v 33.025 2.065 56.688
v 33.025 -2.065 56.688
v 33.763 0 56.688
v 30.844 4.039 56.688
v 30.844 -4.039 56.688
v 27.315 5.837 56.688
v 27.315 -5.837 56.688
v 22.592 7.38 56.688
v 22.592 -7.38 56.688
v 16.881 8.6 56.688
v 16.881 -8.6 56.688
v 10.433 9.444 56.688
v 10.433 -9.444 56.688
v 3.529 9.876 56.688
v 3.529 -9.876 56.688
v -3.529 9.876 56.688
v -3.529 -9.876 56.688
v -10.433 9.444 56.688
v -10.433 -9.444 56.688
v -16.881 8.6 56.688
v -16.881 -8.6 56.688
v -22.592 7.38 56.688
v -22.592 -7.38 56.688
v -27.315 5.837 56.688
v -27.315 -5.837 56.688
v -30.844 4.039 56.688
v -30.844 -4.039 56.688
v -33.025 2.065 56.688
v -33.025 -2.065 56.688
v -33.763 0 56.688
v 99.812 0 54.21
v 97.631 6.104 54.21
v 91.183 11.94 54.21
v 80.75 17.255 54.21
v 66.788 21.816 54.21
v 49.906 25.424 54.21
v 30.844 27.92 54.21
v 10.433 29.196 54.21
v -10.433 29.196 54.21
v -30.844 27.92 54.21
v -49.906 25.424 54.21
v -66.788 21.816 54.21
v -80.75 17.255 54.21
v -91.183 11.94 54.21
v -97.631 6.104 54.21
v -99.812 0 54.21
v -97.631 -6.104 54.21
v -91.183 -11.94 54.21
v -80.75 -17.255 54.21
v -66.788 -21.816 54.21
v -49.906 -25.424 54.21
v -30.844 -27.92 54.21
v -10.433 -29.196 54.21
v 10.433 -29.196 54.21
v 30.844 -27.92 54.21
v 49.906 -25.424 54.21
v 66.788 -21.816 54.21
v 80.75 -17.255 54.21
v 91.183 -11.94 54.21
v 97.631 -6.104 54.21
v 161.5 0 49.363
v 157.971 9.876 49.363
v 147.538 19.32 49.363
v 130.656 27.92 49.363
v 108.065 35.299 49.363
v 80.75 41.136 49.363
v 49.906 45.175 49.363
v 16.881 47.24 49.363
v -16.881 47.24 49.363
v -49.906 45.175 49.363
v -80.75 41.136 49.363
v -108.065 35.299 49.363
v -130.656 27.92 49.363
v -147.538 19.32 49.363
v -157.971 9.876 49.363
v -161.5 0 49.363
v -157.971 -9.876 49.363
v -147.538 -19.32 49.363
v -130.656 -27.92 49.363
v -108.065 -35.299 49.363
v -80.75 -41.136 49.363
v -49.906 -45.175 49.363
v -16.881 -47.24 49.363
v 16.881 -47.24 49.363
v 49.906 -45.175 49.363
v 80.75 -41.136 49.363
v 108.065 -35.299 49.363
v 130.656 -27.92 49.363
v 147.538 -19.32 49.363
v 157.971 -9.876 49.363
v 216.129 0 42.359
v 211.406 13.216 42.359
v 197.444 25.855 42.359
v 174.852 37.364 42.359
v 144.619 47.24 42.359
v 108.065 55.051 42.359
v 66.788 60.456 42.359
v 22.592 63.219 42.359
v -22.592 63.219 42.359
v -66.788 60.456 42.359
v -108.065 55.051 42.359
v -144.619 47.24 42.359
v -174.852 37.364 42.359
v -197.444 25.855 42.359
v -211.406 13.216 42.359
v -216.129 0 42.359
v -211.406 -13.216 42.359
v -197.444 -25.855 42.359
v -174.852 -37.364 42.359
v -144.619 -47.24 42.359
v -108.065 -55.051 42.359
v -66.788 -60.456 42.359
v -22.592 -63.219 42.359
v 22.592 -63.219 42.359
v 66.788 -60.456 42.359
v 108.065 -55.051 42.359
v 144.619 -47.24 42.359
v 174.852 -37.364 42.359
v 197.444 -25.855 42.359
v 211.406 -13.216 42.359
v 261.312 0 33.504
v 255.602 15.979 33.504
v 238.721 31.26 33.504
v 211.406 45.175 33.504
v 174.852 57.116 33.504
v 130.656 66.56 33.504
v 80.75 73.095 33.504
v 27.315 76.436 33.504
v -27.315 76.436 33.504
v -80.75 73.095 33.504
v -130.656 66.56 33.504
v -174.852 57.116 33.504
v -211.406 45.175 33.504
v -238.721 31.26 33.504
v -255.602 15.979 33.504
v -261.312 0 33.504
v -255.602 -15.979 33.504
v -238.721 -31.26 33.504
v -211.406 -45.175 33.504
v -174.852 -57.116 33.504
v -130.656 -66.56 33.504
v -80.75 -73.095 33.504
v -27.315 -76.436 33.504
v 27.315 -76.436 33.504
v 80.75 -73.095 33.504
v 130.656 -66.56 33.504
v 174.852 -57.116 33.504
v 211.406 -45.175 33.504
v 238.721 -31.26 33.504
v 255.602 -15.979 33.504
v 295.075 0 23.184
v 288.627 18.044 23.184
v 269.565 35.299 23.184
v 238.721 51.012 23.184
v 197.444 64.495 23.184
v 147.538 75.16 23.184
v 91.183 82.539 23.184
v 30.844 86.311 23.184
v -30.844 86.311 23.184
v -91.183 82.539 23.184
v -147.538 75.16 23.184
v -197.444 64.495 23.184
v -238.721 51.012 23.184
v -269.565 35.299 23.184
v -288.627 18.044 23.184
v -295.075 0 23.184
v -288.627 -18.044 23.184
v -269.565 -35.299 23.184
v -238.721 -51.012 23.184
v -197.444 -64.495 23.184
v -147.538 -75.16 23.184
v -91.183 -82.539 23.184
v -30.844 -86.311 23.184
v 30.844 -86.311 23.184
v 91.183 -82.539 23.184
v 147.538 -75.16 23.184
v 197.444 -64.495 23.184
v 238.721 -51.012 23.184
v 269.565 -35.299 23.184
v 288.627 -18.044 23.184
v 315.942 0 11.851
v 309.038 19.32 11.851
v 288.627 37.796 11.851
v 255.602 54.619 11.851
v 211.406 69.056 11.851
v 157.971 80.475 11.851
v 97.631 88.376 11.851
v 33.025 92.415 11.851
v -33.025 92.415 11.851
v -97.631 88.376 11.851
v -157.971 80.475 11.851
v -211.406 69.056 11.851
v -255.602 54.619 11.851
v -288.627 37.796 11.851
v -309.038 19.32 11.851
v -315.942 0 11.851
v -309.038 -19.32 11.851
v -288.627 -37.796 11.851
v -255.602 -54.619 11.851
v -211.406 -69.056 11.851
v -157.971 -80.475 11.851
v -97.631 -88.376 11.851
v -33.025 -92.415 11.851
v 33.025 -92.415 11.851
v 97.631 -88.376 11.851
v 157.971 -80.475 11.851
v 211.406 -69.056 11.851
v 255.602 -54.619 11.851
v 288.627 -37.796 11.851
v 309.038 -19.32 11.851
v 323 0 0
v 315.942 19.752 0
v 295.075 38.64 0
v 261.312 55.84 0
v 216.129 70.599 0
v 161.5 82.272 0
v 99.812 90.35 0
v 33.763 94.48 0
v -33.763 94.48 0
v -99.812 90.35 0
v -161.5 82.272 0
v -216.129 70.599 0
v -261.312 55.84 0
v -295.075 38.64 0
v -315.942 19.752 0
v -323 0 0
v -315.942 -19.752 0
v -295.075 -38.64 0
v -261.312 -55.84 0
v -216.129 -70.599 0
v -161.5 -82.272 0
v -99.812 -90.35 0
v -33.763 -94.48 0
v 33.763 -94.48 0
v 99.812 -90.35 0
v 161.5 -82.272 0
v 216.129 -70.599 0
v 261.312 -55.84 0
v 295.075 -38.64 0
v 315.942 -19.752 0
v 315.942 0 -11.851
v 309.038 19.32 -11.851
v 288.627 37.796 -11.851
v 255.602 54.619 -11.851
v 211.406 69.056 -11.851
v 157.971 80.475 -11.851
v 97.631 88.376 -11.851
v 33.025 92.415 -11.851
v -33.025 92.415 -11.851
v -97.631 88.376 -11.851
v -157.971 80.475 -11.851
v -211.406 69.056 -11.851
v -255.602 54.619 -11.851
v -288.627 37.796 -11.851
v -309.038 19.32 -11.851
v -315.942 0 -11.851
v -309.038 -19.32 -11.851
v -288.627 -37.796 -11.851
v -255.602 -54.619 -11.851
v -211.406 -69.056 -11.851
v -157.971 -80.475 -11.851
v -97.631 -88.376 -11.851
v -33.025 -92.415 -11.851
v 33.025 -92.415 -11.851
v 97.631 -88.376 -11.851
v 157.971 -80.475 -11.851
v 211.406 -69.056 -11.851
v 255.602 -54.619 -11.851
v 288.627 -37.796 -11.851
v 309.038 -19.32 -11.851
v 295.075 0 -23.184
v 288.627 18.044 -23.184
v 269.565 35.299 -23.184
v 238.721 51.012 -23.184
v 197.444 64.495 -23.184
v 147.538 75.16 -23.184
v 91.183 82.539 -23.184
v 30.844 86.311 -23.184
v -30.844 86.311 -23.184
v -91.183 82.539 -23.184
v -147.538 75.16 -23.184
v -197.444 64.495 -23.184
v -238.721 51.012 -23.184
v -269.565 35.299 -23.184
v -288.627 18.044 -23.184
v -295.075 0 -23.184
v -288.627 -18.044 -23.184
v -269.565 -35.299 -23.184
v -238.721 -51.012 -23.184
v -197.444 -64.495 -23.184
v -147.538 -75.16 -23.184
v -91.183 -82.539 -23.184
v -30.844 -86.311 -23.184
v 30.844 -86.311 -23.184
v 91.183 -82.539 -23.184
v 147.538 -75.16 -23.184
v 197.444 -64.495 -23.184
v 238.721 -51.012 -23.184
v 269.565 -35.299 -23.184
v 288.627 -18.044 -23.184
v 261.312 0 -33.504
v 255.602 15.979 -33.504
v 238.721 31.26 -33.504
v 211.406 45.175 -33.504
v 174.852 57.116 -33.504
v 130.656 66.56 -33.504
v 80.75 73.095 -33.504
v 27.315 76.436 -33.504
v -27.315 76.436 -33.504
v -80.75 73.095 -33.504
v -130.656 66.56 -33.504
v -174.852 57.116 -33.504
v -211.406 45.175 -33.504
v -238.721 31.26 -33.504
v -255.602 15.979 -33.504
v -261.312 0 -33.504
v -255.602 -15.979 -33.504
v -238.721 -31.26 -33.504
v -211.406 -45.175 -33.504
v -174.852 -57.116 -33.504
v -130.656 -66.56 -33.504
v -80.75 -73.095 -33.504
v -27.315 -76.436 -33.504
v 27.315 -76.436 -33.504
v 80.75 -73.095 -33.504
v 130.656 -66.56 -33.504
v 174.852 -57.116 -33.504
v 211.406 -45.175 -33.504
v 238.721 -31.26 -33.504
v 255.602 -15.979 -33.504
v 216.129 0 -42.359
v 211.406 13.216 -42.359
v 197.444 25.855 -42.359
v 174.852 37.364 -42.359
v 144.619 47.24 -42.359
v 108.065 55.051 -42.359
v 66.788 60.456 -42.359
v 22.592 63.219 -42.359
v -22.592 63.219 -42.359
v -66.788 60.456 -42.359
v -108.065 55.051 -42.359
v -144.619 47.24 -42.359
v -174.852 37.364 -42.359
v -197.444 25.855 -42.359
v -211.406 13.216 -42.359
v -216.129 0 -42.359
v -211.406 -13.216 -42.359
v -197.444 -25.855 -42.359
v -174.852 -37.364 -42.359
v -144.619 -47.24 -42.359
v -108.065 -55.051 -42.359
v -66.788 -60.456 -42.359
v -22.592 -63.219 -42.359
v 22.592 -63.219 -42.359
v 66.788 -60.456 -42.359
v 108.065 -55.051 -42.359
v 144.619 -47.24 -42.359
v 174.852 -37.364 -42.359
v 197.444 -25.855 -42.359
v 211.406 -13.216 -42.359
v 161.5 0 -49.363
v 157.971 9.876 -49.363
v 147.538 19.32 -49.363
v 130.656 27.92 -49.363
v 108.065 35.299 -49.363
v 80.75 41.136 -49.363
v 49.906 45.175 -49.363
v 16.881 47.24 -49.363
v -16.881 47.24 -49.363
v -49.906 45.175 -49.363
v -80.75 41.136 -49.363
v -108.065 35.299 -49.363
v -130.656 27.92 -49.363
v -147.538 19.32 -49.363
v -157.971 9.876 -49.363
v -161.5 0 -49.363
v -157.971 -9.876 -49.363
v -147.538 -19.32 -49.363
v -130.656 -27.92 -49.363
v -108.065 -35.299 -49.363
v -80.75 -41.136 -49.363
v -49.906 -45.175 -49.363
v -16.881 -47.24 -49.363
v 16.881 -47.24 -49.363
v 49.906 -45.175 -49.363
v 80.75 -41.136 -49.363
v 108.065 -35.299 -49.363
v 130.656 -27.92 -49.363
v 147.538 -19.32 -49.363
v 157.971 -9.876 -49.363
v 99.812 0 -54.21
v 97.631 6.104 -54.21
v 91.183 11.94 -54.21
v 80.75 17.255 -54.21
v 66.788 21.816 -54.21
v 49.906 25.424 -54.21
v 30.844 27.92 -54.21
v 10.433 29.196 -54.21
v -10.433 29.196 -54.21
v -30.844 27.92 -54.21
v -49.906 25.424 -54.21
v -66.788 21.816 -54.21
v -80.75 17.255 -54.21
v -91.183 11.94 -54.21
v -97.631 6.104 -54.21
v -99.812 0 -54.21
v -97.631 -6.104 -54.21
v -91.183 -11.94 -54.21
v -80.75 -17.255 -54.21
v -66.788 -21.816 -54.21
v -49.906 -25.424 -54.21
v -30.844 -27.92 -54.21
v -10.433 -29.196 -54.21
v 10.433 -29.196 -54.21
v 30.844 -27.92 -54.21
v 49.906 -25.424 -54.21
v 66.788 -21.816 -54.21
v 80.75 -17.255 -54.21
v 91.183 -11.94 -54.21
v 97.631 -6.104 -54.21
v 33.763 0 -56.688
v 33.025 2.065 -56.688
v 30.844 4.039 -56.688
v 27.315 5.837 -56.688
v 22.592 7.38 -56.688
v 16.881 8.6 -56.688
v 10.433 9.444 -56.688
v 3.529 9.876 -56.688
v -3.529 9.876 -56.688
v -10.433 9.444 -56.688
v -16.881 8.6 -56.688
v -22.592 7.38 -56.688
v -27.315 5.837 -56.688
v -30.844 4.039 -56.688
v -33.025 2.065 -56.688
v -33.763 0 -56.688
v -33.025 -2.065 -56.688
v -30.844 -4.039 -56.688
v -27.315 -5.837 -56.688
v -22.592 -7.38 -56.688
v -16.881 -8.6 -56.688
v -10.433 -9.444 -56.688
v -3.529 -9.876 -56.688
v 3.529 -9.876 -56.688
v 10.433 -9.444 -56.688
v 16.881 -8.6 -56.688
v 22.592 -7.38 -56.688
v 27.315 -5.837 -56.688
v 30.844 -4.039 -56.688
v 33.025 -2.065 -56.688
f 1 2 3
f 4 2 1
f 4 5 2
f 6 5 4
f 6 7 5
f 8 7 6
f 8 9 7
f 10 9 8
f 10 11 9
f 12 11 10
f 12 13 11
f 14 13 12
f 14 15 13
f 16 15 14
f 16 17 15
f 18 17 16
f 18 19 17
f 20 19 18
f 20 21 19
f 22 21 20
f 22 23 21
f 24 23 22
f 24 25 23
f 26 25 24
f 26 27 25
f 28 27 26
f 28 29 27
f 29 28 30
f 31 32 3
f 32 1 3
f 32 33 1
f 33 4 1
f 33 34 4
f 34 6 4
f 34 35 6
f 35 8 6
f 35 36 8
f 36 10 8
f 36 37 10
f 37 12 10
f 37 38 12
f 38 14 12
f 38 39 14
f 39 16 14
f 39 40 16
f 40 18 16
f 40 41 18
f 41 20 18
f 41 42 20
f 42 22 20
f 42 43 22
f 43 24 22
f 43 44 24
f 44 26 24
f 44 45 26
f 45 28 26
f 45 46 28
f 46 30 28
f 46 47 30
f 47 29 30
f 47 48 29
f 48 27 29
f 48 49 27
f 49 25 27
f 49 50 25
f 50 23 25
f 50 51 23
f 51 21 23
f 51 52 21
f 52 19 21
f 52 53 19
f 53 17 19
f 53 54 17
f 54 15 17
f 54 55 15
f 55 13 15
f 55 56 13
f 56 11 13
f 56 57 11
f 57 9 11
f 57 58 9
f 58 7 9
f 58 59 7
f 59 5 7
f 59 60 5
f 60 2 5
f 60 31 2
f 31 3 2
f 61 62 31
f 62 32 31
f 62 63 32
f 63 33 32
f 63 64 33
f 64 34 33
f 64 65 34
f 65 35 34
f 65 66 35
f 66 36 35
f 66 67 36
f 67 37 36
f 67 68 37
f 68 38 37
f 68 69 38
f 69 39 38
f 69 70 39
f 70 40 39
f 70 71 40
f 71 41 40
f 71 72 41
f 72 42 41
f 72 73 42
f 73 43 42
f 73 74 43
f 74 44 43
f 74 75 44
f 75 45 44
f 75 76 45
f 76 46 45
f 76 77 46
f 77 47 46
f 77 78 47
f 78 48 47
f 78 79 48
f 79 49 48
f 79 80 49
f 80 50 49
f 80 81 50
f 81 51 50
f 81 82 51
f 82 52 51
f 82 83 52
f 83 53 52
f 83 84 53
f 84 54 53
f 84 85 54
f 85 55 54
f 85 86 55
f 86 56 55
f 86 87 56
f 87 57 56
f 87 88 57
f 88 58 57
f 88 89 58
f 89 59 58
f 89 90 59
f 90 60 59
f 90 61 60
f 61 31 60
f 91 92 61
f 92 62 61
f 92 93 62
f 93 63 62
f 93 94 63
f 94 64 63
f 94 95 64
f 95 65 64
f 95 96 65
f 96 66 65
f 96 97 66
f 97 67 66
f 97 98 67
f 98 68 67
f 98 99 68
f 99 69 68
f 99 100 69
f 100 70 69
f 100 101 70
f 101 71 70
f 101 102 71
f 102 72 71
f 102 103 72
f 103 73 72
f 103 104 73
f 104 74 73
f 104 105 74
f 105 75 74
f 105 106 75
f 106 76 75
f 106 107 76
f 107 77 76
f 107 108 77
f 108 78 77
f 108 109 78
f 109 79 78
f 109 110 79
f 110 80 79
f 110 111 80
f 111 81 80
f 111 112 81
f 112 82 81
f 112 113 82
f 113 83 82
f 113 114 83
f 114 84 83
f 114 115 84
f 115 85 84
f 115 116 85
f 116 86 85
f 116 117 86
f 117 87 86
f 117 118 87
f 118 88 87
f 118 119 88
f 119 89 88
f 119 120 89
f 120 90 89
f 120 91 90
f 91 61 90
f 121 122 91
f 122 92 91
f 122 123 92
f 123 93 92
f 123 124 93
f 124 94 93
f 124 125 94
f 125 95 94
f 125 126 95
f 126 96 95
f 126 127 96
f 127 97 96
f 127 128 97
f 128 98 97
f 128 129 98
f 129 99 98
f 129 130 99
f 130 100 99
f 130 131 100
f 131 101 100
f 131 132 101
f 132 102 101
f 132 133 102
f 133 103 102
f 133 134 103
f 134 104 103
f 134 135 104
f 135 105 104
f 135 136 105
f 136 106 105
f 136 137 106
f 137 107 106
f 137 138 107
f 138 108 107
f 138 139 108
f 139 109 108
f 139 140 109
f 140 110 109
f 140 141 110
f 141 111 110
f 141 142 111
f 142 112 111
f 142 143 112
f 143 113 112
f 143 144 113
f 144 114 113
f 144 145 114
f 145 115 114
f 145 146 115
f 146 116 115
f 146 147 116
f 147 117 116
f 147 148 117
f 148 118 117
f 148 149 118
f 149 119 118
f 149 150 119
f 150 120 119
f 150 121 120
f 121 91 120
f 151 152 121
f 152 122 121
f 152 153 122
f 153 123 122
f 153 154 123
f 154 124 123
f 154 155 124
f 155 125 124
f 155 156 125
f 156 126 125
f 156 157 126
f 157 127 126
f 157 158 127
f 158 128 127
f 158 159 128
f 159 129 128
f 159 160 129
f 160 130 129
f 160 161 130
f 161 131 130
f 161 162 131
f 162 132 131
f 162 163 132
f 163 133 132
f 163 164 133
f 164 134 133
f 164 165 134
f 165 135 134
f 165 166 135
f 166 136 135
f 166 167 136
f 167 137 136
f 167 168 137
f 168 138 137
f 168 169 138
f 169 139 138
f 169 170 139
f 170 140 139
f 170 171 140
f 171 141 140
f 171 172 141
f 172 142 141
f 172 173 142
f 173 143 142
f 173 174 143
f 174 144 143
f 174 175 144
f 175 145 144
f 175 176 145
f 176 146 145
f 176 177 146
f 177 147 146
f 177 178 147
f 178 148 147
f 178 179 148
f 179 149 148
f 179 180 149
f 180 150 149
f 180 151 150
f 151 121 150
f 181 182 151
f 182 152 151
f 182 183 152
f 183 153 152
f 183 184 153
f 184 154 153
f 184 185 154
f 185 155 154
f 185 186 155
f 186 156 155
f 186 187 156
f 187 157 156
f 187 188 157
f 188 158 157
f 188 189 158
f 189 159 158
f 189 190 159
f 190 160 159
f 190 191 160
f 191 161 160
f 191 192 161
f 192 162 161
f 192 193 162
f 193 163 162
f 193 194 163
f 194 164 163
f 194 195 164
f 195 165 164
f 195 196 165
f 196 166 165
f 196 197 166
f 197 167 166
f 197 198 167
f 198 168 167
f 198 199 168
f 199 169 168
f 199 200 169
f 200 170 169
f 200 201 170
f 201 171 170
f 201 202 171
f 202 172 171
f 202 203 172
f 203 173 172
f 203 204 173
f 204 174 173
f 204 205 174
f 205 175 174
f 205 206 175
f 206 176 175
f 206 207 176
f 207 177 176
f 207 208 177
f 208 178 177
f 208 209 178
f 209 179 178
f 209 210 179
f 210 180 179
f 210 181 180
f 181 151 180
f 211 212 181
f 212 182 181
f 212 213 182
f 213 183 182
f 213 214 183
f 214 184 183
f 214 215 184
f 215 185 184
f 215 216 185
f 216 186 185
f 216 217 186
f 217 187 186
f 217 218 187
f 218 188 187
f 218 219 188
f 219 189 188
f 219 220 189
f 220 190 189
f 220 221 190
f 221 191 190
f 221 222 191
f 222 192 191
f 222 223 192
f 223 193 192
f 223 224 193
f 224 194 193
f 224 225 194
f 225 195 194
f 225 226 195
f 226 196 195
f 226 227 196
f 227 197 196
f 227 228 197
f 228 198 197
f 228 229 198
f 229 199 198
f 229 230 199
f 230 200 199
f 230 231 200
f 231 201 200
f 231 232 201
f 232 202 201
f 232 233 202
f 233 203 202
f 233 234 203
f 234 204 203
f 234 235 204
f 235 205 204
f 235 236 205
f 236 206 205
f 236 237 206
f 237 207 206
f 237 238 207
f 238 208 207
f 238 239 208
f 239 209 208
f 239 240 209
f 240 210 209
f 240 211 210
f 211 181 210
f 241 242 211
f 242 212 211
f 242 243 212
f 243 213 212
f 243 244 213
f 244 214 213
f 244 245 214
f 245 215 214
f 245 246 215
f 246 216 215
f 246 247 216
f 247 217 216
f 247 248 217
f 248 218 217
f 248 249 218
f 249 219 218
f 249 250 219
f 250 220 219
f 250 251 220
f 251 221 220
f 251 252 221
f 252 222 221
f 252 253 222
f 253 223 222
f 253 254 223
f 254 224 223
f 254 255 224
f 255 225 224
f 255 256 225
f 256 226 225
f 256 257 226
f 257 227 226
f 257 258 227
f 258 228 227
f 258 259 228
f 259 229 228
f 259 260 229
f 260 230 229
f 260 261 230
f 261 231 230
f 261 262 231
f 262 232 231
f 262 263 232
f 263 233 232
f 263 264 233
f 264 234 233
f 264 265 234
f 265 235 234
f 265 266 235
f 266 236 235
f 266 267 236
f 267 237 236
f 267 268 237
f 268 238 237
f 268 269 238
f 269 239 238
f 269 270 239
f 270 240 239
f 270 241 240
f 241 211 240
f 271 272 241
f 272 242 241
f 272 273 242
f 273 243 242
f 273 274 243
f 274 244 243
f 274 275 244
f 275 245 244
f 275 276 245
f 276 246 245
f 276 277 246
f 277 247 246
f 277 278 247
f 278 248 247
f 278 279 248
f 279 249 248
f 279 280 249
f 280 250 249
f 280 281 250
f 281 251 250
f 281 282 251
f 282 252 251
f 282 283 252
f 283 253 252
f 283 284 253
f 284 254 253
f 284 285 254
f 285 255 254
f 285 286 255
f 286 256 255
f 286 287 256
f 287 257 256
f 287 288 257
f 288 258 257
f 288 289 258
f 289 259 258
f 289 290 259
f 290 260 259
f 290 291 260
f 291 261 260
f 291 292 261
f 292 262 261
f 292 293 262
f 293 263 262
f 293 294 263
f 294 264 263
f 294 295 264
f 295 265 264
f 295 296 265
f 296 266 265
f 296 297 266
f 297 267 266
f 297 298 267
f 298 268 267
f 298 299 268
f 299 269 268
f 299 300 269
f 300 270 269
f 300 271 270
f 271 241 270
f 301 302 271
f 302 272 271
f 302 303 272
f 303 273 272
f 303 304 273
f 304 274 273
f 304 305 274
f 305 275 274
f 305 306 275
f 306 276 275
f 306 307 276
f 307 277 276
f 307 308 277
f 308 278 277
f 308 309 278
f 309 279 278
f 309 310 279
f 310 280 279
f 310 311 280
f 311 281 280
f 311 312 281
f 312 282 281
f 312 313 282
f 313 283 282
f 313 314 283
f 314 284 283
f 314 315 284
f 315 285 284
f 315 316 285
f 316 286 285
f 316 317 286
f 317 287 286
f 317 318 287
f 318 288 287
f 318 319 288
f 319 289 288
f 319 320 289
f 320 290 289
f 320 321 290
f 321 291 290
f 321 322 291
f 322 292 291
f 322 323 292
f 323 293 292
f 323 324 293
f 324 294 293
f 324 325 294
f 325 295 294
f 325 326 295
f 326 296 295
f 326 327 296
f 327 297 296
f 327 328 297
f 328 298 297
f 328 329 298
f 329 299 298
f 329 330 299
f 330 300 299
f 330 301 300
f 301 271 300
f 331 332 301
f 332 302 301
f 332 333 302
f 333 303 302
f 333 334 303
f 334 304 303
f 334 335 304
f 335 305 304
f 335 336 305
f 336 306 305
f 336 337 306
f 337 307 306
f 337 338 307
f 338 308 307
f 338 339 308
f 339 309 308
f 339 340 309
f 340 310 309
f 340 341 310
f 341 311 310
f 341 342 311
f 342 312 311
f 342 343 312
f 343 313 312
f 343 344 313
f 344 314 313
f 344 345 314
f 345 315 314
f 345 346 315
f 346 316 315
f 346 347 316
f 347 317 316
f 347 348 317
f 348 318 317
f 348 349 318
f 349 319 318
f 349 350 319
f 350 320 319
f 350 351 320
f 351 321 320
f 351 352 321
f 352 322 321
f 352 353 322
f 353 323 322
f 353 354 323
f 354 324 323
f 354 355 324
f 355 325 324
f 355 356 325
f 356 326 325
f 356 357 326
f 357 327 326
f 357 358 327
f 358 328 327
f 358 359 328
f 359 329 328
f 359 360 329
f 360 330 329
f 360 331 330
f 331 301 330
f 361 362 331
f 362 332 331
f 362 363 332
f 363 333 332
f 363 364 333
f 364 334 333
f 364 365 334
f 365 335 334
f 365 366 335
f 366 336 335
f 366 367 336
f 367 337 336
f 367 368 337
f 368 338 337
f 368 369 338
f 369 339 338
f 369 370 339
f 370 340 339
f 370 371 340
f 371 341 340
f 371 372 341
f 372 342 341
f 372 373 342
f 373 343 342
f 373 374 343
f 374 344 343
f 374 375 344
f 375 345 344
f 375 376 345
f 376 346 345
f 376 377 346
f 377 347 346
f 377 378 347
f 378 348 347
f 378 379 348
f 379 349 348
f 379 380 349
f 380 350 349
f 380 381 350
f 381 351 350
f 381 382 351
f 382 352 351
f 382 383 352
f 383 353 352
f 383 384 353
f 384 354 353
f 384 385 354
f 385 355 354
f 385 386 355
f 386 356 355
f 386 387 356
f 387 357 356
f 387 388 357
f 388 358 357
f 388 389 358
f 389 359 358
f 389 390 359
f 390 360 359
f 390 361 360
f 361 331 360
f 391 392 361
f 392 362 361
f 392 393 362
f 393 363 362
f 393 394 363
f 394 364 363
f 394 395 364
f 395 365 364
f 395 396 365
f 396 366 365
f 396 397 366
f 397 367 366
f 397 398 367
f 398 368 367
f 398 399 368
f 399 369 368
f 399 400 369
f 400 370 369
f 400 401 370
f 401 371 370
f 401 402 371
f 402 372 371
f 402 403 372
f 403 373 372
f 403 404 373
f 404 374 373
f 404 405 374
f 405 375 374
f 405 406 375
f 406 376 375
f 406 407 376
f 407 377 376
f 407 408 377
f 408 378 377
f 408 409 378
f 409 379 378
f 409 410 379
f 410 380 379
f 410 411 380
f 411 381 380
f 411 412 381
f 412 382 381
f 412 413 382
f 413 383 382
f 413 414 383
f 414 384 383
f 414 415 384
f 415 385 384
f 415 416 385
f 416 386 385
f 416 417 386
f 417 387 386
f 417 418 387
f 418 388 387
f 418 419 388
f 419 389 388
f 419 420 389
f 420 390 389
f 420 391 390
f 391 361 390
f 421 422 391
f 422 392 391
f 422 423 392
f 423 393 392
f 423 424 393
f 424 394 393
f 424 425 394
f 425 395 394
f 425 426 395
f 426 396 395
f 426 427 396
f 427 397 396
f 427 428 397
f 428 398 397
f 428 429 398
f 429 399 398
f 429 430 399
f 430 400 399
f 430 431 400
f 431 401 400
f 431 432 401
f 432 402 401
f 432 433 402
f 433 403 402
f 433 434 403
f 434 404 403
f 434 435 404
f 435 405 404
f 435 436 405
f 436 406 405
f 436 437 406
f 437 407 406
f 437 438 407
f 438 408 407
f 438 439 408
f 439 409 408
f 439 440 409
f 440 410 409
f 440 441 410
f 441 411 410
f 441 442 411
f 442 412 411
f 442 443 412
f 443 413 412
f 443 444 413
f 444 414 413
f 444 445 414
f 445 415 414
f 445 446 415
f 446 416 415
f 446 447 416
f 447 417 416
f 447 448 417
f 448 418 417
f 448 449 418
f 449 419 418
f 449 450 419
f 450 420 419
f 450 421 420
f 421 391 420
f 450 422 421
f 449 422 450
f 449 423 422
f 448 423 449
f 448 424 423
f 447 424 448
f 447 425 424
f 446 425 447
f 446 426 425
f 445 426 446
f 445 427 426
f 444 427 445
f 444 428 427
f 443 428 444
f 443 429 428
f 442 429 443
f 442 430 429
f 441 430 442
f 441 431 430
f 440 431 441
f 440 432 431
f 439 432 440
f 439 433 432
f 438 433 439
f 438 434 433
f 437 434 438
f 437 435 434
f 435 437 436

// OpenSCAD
// Generated by SolidPython 1.0.1 on 2020-07-29 00:46:52


scale(v = [17, 5, 3]) {
	sphere(r = 19);
}
/***********************************************
*********      SolidPython code:      **********
************************************************
 
# import packages: SolidPython
from solid import *
from solid.utils import *
from itertools import chain, combinations, permutations


class Resize:

    def __init__(self, scad_file):
        self.scad_file = scad_file
        #self.scad_file = import_scad(scad_file)
        # cone/cylinder param:
        self.r1 = 0
        self.r2 = 0
        self.h = 0
        # rectangular prism param:
        self.w = 0
        self.l = 0
        # ellipse param:
        self.r = 0

    # import OpenScad code (file name corresponds to shape)


    # classify shape + parameters
    def assign(self, param1, param2, param3):
        if self.scad_file == 'cone.scad':
            self.r1 = param1
            self.r2 = param2
            self.h = param3
        elif self.scad_file == 'cylinder.scad':
            self.r1 = param1
            self.r2 = param2
            self.h = param3
        elif self.scad_file == 'rectangularPrism.scad':
            self.h = param1
            self.l = param2
            self.w = param3
        else:
            self.r = param1
            self.h = param2

    # resize parameters
    def iterate(self):
        x = range(3, 20, 2)
        i = 1
        if self.scad_file == 'cone.scad':
            tempList = list(permutations(x, 2))
            for temp in tempList:
                param1 = temp[0]
                param2 = temp[1]
                filepath = 'produced_scad_files/' + 'cone' + str(param1) + '_' + str(param2) + '_' + '.scad'
                scad_render_to_file(cylinder(h=param1, r1=param2, r2=0), filepath)

        elif self.scad_file == 'cylinder.scad':
            tempList = list(permutations(x, 3))
            for temp in tempList:
                param1 = temp[0]
                param2 = temp[1]
                filepath = 'produced_scad_files/' + 'cylinder' + str(param1) + '_' + str(param2) + '_' + '.scad'
                scad_render_to_file(cylinder(h=param1, r1=param2, r2=param2), filepath)

        elif self.scad_file == 'rectangularPrism.scad':
            tempList = list(permutations(x, 3))
            for temp in tempList:
                param1 = temp[0]
                param2 = temp[1]
                param3 = temp[2]
                filepath = 'produced_scad_files/' + 'rectangularPrism' + str(param1) + '_' + str(param2) + '_' + str(
                    param3) + '.scad'
                scad_render_to_file(cube(size=(param1, param2, param3)), filepath)

        elif self.scad_file == 'ellipse.scad':
            tempList = list(permutations(x, 4))
            for temp in tempList:
                param1 = temp[0]
                param2 = temp[1]
                param3 = temp[2]
                param4 = temp[3]
                filepath = 'produced_scad_files/' + 'ellipse' + str(param1) + '_' + str(param2) + '_' + str(param3) + '_' + str(param4) + '.scad'
                scad_render_to_file(scale([param1, param2, param3])(sphere(r=param4)), filepath)

    def render_to_scadfile(self):
        scad_render_to_file(scad, 'example.scad') 
 
************************************************/
